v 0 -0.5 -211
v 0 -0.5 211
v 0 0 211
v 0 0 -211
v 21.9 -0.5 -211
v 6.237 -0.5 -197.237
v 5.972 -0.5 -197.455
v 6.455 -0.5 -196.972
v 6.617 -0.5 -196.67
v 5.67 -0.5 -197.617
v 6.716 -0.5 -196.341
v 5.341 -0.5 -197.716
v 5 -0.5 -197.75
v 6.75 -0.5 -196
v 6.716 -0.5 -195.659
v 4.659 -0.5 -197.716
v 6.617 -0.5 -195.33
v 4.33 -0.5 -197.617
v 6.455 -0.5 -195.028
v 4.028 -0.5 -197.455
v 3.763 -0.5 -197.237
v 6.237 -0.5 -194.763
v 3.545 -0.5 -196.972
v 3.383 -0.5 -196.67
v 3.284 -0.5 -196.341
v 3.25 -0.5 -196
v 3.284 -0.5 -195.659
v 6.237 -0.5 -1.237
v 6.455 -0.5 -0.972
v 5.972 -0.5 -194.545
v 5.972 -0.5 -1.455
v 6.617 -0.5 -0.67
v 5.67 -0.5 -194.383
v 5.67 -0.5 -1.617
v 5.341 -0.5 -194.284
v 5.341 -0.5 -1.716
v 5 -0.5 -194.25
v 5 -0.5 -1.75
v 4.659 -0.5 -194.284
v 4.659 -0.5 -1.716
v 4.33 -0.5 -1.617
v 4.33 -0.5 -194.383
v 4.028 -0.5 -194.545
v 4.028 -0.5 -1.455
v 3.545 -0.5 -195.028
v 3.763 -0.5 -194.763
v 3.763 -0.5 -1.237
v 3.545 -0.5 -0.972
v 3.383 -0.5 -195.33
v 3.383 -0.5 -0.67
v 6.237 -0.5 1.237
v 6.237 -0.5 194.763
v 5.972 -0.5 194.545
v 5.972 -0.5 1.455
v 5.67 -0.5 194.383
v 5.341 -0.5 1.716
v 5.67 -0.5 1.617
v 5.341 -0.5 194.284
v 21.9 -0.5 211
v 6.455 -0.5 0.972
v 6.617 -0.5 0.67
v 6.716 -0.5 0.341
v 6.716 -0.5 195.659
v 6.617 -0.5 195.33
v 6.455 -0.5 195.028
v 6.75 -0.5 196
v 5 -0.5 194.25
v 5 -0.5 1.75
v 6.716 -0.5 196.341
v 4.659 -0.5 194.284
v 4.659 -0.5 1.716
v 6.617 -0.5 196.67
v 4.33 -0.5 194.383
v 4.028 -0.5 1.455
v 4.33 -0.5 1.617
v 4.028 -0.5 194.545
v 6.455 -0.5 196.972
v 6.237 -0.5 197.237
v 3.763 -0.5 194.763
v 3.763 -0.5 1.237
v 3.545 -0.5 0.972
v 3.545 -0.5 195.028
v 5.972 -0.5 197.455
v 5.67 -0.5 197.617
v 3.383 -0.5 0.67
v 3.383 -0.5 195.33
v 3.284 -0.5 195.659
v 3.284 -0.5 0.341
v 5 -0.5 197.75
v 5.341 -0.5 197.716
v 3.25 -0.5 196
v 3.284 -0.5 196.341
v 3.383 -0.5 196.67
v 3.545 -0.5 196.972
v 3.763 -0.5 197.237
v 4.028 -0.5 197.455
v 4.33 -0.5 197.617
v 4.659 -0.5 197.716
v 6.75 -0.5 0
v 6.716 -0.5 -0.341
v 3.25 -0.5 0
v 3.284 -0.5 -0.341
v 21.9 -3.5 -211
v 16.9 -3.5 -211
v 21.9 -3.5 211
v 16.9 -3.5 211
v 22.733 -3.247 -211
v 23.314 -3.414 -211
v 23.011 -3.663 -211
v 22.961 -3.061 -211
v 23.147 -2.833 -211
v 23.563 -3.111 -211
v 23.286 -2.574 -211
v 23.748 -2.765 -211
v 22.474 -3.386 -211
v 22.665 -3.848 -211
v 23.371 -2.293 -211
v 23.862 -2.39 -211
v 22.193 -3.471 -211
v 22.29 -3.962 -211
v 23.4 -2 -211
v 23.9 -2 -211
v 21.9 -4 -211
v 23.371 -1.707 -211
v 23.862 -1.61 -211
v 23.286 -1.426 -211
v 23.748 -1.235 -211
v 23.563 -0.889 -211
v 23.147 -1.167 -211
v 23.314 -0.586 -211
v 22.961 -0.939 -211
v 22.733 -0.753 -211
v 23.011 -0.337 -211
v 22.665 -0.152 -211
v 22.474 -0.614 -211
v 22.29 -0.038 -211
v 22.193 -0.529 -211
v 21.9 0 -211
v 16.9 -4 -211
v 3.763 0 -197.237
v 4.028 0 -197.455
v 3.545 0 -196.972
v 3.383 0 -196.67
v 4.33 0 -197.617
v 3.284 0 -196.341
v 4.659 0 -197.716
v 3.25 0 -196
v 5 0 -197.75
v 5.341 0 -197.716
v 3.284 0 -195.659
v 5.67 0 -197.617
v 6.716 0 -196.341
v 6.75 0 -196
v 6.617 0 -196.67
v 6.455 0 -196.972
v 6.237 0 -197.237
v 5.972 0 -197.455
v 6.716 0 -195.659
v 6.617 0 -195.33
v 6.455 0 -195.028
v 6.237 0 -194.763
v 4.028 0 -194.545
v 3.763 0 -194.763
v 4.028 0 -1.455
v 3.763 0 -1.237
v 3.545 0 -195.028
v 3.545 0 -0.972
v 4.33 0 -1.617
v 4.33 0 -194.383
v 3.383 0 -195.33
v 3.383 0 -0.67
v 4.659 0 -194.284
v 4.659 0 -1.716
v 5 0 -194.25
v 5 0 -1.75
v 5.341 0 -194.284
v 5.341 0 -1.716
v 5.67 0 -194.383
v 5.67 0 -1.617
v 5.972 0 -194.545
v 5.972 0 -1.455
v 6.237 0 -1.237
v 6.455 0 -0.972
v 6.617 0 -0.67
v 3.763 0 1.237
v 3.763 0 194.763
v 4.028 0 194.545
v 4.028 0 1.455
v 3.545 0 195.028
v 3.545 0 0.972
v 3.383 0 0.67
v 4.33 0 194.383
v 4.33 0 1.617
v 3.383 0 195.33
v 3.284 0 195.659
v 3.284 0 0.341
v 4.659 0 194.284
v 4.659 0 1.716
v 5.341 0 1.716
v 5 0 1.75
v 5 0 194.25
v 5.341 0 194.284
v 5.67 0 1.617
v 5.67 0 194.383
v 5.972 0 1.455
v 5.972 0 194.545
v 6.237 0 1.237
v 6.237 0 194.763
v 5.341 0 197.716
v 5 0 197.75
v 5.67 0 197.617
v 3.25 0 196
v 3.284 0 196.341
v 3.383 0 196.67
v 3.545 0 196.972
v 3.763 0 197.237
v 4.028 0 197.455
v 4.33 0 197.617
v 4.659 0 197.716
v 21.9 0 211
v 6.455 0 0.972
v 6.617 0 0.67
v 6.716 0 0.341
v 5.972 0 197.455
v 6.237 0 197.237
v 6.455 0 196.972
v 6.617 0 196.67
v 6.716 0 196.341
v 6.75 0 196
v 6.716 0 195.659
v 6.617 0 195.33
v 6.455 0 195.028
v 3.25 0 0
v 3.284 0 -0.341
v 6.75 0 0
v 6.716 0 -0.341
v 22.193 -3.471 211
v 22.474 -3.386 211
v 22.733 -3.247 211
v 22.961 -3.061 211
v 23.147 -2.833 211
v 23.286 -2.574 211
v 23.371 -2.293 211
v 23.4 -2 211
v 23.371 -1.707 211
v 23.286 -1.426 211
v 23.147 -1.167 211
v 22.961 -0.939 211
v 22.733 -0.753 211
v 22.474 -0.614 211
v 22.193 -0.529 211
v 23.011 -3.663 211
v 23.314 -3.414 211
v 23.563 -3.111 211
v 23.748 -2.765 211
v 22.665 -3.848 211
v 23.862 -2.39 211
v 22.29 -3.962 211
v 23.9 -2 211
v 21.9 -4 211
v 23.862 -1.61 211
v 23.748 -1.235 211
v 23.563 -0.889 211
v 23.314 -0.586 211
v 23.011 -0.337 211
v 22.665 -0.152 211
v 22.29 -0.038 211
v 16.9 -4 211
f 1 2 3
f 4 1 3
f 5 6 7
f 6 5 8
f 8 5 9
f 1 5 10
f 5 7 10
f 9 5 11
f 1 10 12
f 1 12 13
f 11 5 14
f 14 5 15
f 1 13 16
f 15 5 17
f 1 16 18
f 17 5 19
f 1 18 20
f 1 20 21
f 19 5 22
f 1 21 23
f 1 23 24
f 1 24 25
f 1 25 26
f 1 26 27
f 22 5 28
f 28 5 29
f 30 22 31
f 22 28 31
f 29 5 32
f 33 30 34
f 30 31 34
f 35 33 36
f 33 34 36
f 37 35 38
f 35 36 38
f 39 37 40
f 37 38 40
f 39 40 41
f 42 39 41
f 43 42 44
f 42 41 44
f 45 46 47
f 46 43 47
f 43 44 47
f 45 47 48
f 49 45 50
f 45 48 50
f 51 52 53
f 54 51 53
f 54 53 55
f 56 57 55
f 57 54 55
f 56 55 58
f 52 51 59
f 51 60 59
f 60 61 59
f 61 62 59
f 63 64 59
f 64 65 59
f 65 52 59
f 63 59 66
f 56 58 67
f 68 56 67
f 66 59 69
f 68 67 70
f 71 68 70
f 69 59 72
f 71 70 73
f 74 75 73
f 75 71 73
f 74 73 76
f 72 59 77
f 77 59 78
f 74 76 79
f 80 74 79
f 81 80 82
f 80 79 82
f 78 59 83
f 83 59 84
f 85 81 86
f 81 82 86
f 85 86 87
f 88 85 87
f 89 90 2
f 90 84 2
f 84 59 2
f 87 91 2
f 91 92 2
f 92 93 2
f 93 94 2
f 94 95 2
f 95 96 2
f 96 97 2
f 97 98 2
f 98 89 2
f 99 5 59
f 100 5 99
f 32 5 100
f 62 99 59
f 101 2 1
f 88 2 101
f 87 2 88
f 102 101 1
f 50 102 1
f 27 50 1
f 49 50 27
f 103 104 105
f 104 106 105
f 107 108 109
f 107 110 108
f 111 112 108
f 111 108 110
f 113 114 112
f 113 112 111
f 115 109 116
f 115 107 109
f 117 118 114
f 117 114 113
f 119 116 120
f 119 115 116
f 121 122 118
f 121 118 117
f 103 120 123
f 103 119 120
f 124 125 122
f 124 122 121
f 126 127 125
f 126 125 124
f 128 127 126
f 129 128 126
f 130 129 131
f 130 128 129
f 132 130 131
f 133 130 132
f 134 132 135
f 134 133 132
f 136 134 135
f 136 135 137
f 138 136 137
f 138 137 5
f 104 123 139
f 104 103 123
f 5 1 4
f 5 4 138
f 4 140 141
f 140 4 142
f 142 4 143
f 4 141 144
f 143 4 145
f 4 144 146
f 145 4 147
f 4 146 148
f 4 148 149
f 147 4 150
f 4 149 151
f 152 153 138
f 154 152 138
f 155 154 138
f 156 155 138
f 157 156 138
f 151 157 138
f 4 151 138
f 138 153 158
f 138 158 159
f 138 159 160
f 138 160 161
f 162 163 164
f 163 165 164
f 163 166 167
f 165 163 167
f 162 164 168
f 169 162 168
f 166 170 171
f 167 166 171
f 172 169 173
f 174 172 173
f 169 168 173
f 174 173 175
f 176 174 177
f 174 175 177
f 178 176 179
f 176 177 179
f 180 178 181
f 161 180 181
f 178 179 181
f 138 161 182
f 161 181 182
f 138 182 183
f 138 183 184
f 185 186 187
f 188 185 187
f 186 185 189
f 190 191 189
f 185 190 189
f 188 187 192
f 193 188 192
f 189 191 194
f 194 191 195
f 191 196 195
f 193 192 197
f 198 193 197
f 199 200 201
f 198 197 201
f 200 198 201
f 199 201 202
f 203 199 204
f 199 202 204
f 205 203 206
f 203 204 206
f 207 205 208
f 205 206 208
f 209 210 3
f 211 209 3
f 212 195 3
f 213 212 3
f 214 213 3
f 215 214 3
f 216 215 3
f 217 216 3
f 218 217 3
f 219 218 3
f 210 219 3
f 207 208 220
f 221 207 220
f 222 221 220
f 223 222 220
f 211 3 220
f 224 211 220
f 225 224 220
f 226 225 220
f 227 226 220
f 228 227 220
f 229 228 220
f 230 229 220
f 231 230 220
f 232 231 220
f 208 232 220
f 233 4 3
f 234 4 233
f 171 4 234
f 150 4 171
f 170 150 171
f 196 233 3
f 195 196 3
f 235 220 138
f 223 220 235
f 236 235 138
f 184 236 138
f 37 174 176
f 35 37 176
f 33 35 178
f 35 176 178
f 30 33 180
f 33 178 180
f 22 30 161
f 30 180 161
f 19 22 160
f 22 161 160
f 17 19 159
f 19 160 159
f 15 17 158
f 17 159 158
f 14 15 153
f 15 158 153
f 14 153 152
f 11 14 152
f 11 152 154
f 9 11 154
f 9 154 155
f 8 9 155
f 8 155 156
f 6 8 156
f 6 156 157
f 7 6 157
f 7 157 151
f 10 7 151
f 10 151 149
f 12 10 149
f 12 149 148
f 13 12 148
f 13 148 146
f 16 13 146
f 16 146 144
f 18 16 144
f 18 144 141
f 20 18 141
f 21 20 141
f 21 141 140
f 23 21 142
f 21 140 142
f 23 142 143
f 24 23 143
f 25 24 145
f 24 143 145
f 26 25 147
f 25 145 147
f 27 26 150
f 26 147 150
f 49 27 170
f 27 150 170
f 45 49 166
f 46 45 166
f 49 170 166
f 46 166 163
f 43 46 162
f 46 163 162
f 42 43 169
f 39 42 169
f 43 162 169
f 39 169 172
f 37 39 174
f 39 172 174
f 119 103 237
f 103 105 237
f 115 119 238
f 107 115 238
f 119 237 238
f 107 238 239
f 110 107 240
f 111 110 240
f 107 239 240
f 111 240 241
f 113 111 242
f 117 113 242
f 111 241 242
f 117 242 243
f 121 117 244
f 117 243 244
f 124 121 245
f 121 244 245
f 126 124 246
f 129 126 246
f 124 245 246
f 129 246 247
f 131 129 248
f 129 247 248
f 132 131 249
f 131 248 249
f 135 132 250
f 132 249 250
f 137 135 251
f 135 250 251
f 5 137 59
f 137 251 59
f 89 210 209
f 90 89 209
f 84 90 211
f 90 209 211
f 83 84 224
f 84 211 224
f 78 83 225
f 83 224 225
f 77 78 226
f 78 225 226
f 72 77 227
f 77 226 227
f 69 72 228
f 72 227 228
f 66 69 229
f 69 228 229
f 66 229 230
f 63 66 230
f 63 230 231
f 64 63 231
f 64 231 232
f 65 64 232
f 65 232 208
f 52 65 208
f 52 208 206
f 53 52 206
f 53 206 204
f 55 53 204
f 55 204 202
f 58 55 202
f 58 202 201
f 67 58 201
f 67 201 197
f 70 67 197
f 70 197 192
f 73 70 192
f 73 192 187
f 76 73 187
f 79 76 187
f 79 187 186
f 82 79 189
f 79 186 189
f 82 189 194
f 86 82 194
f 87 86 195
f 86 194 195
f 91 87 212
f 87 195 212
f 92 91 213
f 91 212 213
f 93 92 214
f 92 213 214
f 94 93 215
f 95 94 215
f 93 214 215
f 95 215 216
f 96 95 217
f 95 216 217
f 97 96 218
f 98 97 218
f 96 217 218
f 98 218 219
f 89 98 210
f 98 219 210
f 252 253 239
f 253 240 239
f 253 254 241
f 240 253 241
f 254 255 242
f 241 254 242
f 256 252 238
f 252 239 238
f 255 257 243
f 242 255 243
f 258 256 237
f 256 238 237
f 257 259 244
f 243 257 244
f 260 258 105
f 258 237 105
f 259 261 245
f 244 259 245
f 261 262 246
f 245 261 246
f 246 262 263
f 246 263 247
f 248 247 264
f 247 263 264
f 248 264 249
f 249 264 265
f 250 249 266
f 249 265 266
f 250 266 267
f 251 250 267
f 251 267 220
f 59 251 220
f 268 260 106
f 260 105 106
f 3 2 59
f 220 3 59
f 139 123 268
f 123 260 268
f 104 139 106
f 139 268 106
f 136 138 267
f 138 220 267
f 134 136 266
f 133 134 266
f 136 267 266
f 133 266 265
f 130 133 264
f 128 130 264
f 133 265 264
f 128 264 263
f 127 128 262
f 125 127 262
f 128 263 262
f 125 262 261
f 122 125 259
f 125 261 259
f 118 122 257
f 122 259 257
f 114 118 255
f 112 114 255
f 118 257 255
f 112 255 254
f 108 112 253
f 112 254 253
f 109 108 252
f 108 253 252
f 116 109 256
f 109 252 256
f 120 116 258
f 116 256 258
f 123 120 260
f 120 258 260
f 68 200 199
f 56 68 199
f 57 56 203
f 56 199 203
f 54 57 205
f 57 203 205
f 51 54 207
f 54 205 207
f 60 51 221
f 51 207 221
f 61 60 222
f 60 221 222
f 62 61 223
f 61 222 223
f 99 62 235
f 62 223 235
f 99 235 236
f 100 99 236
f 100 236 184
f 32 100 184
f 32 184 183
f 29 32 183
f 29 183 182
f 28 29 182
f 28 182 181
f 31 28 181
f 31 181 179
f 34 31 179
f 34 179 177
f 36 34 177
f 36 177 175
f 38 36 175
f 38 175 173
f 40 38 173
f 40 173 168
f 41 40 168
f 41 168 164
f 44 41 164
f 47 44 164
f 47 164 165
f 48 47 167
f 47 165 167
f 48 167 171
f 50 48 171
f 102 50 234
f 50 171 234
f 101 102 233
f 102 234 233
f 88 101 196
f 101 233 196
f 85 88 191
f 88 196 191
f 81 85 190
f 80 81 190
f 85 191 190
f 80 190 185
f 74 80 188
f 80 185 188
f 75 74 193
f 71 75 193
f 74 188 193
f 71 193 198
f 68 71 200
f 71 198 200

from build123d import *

# Parameters (mm, degrees)
BASE_FLANGE1_DEPTH = 211
SKETCH10_R         = 1.75
EXTRUDE2_DEPTH     = 10


# Sheet-metal steps are written as plain solids
with BuildPart() as part:
    # Sketch1 → Base-Flange1 (new, symmetric)
    with BuildSketch(Plane.XY):
        with BuildLine():
            Line((0, 0), (21.9, 0))
            ThreePointArc((21.9, 0), (23.9, -2), (21.9, -4))
            Line((21.9, -4), (16.9, -4))
            Line((16.9, -4), (16.9, -3.5))
            Line((16.9, -3.5), (21.9, -3.5))
            ThreePointArc((21.9, -3.5), (23.4, -2), (21.9, -0.5))
            Line((21.9, -0.5), (0, -0.5))
            Line((0, -0.5), (0, 0))
        make_face()
    extrude(amount=BASE_FLANGE1_DEPTH, both=True)

    # Sketch10 → Extrude2 (cut)
    with BuildSketch(Plane(origin=(0, 0, 0), x_dir=(1, 0, 0), z_dir=(0, 1, 0))):
        with Locations(Location((5, 0, 0), (0, 0, 270))):
            Circle(SKETCH10_R)
        with Locations(Location((5, 196, 0), (0, 0, 270))):
            Circle(SKETCH10_R)
        with Locations(Location((5, -196, 0), (0, 0, 270))):
            Circle(SKETCH10_R)
    extrude(amount=-EXTRUDE2_DEPTH, mode=Mode.SUBTRACT)


solid = part.part
